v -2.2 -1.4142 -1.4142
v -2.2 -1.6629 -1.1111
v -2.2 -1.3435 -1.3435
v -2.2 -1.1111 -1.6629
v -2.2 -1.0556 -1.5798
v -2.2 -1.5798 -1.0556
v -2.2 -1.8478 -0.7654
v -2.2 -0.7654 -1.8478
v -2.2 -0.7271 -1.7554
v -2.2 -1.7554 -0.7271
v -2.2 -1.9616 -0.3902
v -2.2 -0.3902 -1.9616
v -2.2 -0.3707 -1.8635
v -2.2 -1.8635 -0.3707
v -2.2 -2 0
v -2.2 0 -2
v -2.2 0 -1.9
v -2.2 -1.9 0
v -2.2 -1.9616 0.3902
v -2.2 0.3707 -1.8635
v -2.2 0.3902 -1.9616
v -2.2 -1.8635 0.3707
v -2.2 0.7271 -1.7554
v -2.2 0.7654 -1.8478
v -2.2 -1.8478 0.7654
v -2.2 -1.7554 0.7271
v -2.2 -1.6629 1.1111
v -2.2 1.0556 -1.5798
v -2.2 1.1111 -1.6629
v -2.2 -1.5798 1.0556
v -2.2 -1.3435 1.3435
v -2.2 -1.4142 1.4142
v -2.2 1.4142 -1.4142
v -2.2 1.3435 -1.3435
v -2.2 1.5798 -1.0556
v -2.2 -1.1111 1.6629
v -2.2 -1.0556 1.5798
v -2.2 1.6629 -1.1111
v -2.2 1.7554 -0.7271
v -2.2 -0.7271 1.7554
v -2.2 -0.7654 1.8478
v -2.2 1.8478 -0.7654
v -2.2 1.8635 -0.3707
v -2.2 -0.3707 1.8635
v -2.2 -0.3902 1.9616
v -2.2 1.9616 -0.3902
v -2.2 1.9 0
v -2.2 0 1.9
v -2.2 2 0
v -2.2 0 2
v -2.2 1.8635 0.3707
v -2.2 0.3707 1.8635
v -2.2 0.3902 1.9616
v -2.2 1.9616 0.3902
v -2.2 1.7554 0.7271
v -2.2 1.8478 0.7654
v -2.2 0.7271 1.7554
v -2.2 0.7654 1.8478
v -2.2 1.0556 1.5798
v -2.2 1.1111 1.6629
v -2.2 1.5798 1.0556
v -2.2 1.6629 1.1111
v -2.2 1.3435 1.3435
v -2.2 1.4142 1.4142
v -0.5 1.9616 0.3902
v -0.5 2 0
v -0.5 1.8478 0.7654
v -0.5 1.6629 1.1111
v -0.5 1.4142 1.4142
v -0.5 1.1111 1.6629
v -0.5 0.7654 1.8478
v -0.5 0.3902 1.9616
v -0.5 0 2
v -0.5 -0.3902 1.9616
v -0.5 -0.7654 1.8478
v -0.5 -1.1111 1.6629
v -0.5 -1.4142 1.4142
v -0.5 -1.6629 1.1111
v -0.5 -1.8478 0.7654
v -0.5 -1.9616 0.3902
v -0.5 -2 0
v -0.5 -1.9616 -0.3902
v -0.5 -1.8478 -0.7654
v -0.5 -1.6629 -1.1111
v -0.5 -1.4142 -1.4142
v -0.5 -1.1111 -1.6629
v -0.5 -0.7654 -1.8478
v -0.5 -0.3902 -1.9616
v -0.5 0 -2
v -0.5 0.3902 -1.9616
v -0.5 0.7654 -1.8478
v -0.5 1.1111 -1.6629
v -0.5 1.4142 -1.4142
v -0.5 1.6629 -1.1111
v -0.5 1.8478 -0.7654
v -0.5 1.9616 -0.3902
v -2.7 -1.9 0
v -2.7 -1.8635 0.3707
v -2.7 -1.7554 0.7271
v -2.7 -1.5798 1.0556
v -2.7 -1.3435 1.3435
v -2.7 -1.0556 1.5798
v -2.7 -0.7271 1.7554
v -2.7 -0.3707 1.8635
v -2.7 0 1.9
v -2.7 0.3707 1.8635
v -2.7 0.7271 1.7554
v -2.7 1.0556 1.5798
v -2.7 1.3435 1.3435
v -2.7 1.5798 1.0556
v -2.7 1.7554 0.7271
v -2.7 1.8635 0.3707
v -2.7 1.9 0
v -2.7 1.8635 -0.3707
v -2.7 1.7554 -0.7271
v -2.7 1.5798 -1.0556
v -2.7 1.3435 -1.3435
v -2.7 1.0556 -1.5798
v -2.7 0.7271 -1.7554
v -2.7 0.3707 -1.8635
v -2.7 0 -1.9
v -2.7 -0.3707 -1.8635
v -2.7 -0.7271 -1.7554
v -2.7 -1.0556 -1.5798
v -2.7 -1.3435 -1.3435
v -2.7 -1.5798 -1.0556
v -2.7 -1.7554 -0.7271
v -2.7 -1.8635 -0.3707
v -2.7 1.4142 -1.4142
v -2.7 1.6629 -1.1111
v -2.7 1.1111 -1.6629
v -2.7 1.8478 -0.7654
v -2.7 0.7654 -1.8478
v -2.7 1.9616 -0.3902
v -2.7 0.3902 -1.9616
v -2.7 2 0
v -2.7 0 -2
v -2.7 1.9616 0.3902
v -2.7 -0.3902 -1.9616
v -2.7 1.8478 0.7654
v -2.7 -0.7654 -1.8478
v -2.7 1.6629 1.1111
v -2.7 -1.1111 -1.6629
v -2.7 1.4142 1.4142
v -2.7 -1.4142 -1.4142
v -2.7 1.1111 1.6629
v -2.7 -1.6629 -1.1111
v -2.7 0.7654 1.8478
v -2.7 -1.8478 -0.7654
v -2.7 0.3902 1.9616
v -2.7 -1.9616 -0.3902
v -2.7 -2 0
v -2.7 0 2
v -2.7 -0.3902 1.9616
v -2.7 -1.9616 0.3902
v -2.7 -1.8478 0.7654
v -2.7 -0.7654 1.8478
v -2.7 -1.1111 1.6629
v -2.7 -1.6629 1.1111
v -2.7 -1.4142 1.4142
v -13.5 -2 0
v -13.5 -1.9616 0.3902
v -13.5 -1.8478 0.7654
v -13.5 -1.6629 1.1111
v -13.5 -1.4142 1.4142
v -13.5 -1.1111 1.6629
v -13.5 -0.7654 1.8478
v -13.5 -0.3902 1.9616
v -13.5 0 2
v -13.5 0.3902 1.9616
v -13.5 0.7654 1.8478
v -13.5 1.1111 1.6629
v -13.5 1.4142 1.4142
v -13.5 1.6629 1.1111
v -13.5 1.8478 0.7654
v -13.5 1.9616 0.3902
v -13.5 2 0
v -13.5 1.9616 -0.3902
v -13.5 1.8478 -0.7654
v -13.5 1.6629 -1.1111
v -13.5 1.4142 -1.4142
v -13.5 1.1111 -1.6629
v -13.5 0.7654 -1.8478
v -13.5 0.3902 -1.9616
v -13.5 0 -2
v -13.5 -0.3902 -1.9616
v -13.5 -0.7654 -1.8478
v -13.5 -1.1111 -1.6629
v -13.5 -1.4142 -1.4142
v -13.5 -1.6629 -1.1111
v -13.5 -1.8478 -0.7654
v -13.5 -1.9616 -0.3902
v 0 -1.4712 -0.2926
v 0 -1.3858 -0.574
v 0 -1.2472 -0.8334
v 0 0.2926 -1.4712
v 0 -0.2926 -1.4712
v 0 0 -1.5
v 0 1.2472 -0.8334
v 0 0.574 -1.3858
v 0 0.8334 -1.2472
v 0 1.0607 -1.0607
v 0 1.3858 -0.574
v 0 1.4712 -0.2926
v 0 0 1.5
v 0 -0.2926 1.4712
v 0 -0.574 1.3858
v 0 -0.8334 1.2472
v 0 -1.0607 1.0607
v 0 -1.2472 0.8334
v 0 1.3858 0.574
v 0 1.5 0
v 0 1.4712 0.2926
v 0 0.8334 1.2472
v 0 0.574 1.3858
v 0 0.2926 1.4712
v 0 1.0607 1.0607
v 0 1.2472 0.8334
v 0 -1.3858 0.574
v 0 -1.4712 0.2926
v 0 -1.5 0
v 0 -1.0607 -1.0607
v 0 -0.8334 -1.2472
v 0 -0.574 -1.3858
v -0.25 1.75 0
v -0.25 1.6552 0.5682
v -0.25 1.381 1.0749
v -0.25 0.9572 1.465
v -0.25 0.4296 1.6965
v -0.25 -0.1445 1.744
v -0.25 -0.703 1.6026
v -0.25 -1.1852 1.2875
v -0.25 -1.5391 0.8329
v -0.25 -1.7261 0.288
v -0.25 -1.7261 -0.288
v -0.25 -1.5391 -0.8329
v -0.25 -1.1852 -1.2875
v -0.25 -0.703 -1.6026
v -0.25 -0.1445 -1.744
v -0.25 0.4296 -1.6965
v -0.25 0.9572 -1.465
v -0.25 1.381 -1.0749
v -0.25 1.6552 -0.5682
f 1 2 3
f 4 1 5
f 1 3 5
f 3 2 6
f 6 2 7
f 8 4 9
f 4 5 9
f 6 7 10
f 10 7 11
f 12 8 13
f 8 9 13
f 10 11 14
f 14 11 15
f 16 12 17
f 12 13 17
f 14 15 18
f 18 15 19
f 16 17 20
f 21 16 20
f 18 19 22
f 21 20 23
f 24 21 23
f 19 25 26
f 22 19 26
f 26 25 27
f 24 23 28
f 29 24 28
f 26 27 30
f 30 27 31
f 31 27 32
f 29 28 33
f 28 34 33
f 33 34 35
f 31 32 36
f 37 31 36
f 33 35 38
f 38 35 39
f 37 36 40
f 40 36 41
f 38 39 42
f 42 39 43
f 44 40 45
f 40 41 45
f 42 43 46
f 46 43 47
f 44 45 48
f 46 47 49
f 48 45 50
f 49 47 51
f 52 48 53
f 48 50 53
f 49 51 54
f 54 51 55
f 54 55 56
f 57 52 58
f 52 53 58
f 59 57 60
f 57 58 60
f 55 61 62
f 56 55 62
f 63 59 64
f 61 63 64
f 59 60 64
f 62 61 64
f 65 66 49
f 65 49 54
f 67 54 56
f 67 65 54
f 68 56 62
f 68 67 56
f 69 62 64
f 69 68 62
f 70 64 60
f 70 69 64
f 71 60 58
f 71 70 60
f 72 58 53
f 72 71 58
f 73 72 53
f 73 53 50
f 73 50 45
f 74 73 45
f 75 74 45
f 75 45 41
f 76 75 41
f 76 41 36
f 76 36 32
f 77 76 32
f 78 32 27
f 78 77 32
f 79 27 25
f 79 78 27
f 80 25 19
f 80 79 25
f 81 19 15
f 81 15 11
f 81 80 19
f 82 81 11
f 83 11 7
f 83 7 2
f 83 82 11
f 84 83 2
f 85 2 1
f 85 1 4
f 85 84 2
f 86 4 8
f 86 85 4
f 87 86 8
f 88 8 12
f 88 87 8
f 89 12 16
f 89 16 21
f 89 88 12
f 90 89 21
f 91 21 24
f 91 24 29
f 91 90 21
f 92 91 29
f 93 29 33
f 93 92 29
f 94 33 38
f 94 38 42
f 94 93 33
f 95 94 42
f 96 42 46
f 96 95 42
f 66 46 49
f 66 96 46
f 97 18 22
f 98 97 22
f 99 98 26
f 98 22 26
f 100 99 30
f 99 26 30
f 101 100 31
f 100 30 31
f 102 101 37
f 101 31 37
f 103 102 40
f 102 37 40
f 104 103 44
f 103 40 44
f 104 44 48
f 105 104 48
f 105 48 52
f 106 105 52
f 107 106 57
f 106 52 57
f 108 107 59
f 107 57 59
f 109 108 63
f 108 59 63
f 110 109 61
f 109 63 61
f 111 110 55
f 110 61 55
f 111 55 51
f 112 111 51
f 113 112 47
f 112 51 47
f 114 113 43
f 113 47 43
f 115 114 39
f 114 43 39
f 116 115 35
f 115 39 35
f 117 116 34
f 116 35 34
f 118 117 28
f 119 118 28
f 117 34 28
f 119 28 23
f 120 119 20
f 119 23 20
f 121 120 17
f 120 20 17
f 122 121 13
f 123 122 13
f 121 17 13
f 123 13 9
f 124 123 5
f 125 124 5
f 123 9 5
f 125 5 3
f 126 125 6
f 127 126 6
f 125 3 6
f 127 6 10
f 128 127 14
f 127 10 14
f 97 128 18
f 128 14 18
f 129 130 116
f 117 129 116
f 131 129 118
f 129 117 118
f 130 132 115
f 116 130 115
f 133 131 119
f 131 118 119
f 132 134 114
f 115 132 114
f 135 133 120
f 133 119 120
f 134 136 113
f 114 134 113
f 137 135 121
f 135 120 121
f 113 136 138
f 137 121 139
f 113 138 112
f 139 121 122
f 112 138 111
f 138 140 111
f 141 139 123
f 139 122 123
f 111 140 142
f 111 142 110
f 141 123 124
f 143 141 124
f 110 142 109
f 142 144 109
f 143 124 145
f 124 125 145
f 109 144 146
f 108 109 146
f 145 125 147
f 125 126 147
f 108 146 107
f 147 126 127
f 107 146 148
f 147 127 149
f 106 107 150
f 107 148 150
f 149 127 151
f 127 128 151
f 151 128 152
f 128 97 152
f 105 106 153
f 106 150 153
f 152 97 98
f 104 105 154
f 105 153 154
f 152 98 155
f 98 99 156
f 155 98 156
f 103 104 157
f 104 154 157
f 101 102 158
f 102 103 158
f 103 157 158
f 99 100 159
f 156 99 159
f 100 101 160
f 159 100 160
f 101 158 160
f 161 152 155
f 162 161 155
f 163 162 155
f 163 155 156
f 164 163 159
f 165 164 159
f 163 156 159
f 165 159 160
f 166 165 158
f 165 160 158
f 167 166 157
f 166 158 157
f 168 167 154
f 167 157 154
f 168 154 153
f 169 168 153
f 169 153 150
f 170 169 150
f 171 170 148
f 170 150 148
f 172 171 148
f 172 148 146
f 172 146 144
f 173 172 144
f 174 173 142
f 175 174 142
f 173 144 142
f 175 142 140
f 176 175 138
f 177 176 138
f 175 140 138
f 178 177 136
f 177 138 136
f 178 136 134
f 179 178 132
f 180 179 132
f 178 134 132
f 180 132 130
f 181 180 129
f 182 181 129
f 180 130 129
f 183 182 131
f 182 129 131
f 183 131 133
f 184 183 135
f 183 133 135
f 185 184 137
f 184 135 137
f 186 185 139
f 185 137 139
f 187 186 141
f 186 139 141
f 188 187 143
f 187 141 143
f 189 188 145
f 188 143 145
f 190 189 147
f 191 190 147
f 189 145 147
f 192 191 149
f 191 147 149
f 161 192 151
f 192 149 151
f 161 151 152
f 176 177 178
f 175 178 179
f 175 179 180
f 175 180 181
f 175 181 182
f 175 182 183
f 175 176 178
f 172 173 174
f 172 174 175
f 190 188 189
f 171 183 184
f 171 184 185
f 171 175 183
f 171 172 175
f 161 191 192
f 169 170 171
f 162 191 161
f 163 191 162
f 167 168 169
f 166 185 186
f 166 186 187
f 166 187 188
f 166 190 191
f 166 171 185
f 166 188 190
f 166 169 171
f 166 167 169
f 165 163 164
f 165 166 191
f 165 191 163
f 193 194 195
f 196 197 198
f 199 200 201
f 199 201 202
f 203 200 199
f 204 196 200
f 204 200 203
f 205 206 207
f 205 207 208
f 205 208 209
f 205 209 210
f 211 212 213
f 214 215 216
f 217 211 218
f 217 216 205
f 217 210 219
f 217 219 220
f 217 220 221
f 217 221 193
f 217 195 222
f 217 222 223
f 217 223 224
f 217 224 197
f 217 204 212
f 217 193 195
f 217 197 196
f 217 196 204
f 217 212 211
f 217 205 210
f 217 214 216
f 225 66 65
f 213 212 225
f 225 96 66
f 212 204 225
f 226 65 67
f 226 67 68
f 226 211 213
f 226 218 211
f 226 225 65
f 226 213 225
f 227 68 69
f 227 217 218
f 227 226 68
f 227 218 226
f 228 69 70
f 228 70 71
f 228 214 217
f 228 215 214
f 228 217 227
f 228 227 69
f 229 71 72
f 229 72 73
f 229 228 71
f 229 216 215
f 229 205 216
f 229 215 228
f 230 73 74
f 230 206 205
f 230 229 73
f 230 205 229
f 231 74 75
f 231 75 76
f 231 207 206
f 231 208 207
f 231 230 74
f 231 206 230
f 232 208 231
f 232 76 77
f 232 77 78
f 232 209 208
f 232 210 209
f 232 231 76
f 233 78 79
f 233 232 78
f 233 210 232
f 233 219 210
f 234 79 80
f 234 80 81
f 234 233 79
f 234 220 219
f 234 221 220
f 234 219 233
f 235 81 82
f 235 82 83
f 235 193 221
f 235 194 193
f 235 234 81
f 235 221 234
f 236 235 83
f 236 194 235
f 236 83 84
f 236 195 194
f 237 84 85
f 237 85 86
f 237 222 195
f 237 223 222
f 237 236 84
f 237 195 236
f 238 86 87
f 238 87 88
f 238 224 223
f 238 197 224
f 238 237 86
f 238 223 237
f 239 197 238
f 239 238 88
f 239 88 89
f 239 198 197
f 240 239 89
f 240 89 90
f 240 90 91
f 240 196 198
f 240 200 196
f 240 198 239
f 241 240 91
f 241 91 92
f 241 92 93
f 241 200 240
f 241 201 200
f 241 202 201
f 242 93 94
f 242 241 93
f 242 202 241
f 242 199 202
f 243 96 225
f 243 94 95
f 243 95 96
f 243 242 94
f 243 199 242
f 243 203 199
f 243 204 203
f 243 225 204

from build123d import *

# Parameters (mm, degrees)
F0_R     = 2
F1_DEPTH = 2.2
F2_R     = 1.9
F3_DEPTH = 0.5
F4_R     = 2
F5_DEPTH = 10.8
F6_SIZE  = 0.5


with BuildPart() as f1:
    # F0 (on Right) → F1 (new body)
    with BuildSketch(Plane.YZ):
        Circle(F0_R)
    extrude(amount=-F1_DEPTH)

    # F2 (on face) → F3 (join)
    with BuildSketch(Plane(origin=(-2.2, 0, 0), x_dir=(0, -1, 0), z_dir=(-1, 0, 0))):
        Circle(F2_R)
    extrude(amount=F3_DEPTH)

    # F4 (on face) → F5 (join)
    with BuildSketch(Plane(origin=(-2.7, 0, 0), x_dir=(0, -1, 0), z_dir=(-1, 0, 0))):
        Circle(F4_R)
    extrude(amount=F5_DEPTH)

    # F6
    f6_edges = [f1.edges().sort_by_distance(p)[0] for p in [
        (0, -2, 0),
    ]]
    chamfer(f6_edges, length=F6_SIZE)


solid = f1.part
